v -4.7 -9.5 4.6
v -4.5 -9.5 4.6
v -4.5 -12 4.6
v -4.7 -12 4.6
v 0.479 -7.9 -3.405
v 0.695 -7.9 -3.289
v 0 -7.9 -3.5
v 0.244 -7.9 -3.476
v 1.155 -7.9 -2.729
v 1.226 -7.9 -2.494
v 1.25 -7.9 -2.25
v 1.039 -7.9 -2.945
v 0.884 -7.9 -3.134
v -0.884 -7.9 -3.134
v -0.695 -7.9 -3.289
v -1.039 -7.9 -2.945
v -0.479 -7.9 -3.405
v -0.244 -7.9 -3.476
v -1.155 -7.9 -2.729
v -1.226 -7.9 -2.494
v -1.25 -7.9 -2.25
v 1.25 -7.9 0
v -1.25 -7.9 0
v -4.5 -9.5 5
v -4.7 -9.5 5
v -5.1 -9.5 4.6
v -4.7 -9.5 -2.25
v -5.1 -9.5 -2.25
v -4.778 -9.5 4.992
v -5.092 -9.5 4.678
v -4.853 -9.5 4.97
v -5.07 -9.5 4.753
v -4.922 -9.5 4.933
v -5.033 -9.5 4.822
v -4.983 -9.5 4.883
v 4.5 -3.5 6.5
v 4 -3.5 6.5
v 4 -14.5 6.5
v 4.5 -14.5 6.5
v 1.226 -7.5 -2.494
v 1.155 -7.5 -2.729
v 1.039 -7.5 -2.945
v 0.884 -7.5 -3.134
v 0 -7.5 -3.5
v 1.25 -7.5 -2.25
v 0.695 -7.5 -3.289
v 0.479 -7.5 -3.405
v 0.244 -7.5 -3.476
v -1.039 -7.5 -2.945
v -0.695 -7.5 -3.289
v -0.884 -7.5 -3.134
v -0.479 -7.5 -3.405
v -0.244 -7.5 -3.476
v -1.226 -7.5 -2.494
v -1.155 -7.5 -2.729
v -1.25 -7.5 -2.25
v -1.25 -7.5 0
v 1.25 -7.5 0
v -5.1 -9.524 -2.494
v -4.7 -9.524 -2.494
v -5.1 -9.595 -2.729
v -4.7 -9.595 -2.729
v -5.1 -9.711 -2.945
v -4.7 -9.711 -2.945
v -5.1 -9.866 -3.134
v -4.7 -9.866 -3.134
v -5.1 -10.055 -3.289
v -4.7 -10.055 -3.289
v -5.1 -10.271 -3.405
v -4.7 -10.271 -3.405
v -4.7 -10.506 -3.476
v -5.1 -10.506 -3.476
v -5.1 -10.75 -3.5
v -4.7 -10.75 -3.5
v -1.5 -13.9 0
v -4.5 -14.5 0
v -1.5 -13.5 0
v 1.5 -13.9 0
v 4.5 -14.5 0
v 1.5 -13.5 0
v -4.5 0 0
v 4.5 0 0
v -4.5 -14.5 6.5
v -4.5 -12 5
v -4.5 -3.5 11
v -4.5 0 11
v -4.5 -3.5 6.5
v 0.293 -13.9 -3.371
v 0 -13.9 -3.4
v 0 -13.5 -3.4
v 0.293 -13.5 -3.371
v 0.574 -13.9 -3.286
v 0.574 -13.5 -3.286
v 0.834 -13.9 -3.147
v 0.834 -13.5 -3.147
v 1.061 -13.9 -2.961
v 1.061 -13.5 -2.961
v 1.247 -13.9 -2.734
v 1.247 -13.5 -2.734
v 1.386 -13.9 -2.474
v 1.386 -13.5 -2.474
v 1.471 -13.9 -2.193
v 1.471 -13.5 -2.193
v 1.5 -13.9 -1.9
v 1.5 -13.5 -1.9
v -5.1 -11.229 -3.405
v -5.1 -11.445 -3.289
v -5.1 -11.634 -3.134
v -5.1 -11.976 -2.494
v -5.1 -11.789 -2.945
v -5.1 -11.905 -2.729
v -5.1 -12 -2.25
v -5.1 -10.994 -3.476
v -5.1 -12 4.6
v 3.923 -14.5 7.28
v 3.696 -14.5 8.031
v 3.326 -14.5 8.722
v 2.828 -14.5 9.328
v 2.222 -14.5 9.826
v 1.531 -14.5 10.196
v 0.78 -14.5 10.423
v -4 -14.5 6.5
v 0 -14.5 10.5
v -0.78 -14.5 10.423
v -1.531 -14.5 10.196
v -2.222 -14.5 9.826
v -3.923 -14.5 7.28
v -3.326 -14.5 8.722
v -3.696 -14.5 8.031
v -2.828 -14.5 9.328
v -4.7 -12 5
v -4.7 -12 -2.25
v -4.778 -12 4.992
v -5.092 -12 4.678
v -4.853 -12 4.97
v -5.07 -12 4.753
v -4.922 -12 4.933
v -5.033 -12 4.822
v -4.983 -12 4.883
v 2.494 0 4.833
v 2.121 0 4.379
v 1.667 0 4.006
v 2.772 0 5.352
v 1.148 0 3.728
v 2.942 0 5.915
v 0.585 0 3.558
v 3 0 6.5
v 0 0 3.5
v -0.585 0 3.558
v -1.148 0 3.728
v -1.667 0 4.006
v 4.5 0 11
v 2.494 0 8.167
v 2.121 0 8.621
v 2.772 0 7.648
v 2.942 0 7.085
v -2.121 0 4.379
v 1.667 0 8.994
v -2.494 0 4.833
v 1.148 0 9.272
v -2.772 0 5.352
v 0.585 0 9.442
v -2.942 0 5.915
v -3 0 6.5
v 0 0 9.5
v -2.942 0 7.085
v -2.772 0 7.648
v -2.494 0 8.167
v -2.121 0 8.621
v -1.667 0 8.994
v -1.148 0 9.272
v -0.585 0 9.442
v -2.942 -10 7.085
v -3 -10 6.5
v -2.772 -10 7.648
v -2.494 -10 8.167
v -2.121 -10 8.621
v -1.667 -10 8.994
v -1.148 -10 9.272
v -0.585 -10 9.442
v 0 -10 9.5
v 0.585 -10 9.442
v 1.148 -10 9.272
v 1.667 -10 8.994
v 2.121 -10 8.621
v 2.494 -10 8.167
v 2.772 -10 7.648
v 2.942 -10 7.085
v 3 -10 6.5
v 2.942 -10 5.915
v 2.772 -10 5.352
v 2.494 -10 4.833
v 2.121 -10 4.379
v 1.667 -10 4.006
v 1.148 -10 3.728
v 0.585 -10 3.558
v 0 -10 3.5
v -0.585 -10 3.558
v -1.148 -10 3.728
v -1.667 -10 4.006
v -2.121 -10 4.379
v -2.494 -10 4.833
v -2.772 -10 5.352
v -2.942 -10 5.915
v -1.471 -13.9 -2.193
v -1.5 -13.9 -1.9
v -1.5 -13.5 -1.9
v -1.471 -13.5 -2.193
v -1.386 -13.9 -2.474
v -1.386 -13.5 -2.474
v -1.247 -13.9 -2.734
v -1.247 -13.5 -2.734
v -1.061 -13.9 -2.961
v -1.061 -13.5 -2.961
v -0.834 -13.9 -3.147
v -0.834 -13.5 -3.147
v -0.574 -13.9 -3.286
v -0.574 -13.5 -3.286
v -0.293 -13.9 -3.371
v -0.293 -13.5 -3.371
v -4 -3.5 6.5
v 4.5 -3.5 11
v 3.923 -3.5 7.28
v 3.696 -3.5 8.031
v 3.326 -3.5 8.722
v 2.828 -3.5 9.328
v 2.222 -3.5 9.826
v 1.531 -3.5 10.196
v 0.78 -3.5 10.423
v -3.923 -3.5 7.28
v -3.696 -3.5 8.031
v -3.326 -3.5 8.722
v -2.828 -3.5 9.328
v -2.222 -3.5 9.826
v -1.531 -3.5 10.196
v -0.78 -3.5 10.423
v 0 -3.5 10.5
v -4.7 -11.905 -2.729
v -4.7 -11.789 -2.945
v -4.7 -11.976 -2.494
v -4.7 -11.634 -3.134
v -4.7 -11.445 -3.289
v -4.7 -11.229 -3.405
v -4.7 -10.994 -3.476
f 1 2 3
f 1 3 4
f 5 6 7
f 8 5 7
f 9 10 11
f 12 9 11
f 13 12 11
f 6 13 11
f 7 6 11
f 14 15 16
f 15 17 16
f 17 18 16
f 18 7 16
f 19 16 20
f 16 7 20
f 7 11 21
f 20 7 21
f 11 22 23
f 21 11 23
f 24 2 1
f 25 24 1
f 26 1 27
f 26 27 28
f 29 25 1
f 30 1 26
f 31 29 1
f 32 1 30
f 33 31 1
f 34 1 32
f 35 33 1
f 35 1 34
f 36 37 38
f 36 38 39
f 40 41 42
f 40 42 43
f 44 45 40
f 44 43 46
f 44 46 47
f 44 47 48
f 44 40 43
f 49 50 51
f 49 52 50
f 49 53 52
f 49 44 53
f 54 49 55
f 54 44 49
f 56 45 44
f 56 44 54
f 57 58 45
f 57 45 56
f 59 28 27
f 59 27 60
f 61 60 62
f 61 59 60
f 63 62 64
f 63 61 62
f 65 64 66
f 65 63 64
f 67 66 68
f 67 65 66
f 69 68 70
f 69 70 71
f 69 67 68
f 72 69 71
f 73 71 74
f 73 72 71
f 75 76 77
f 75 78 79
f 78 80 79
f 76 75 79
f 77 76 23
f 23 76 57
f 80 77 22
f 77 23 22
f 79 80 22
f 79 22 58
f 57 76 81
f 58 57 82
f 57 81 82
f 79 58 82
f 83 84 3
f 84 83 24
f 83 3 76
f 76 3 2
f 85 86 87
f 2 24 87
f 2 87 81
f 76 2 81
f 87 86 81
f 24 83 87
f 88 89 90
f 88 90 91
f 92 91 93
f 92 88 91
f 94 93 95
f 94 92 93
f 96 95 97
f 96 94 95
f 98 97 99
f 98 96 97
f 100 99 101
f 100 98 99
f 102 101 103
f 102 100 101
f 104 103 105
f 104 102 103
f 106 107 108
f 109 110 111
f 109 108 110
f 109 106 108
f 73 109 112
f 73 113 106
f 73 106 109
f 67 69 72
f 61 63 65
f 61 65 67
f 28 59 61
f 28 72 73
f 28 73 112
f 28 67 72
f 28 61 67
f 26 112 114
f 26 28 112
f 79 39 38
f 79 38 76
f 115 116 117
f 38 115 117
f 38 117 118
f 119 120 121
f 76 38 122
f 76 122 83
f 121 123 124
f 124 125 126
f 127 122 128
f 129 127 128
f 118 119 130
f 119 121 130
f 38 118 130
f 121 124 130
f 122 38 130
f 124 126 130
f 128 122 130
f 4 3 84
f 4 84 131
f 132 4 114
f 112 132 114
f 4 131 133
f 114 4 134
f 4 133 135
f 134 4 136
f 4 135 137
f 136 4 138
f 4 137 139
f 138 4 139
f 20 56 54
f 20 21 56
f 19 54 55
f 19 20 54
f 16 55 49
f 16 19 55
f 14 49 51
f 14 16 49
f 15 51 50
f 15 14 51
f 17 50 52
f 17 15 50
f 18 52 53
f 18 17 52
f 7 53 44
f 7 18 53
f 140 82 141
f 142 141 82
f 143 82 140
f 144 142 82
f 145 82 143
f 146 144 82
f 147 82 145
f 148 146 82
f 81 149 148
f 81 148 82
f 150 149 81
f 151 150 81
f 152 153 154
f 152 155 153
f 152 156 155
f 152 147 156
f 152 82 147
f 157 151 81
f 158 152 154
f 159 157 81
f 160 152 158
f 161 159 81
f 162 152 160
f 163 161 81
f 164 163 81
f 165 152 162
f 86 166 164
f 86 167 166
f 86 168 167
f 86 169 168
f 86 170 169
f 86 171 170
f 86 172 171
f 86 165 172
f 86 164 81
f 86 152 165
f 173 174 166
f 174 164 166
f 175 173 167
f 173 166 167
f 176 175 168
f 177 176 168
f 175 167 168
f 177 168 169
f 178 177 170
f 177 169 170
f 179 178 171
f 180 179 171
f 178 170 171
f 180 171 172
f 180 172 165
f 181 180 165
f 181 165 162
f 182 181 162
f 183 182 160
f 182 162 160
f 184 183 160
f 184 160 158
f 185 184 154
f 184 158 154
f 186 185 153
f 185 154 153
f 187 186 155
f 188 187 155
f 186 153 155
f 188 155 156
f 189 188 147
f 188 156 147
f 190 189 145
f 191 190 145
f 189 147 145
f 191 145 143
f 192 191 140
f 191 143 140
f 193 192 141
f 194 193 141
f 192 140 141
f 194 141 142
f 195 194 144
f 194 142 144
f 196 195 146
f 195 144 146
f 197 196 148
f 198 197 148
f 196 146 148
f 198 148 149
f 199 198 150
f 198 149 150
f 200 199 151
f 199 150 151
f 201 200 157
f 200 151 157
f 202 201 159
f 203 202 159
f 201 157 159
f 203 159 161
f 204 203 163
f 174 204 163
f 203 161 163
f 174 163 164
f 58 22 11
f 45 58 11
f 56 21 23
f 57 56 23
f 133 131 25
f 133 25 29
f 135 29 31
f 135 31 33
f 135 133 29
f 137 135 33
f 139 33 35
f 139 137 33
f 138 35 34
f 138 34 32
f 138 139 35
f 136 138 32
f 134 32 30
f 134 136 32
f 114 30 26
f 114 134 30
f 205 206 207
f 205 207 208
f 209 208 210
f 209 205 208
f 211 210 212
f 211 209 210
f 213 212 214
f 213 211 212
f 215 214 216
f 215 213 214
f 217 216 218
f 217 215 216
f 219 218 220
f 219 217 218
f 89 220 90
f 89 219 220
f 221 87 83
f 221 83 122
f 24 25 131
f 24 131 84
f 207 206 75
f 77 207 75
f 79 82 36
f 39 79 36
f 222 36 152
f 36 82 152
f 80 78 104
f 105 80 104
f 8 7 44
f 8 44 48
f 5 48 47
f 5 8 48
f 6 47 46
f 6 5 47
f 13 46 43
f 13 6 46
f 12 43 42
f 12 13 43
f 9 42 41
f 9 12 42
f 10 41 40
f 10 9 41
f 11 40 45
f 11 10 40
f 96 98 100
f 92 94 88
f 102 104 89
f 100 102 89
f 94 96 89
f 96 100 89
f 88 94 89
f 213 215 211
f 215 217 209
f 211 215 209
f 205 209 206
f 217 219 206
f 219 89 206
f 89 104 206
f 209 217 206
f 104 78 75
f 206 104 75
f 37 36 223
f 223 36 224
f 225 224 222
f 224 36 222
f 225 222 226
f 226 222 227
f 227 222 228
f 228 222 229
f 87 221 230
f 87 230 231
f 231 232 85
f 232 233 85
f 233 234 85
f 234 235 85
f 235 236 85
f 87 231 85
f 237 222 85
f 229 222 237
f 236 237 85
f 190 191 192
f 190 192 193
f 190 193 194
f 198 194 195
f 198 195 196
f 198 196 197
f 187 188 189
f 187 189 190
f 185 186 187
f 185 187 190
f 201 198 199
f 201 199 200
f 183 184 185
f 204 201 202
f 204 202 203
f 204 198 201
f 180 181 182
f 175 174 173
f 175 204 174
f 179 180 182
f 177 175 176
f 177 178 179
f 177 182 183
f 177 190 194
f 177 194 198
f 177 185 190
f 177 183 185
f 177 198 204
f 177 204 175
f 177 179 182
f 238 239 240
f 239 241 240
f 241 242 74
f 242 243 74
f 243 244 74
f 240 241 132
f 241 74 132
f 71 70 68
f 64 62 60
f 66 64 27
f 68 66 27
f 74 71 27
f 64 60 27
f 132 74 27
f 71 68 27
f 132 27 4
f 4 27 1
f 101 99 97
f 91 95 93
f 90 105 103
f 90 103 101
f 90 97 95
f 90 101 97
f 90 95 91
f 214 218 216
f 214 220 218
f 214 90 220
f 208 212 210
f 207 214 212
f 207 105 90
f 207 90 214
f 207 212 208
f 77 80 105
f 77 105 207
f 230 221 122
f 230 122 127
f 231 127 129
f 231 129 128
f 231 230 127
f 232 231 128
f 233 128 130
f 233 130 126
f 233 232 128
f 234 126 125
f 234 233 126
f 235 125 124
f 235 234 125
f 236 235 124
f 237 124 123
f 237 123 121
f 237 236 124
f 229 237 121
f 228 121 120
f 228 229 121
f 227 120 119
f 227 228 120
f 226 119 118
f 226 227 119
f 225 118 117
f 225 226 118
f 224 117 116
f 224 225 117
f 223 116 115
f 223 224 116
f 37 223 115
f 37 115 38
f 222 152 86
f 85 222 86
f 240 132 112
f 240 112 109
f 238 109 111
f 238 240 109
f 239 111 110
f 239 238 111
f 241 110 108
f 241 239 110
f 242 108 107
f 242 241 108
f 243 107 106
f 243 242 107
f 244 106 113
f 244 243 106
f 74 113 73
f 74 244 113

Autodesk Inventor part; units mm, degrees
sketch "スケッチ1" plane through (0, 0, 0) normal (0, 1, 0) x (-1, 0, 0)
  line L0 (-4.5, 11) -> (4.5, 11)
  line L1 (4.5, 11) -> (4.5, 0)
  line L2 (4.5, 0) -> (-4.5, 0)
  line L3 (-4.5, 0) -> (-4.5, 11)
  point P0 (0, 0)
  dimension "d0" = 9
  dimension "d1" = 4.5
  dimension "d2" = 11
extrude "押し出し1" add sketch "スケッチ1" against normal blind 3.5
sketch "スケッチ3" plane through (0, 0, 0) normal (0, 1, 0) x (-1, 0, 0)
  circle A0 centre (0, 6.5) radius 4
  line L0 (-4, 6.5) -> (4, 6.5)
  line L1 (4, 6.5) -> (4, 0)
  line L2 (4, 0) -> (-4, 0)
  line L3 (-4, 0) -> (-4, 6.5)
  point P0 (0, 0)
  dimension "d9" = 8
  dimension "d10" = 6.5
extrude "押し出し3" add sketch "スケッチ3" against normal blind 14.5
ref_plane "作業平面1" through (0, -9.5, 0) normal (0, 1, 0) x (-1, 0, 0)
sketch "スケッチ4" plane through (0, 0, 0) normal (0, 1, 0) x (-1, 0, 0)
  point P0 (0, 0)
sketch "スケッチ5" plane through (0, 0, 0) normal (0, 1, 0) x (-1, 0, 0)
  line L0 (-4.5, 0) -> (4.5, 0)
  line L1 (4.5, 0) -> (4.5, 6.5)
  line L2 (4.5, 6.5) -> (-4.5, 6.5)
  line L3 (-4.5, 6.5) -> (-4.5, 0)
  point P0 (0, 0)
  dimension "d14" = 4.5
  dimension "d15" = 9
  dimension "d16" = 6.5
extrude "押し出し4" add sketch "スケッチ5" against normal blind 14.5
sketch "スケッチ6" plane through (0, -9.5, 0) normal (0, 1, 0) x (-1, 0, 0)
  line L0 (5.1, 5) -> (4.9, 5)
  line L1 (4.9, 5) -> (4.9, -3.5)
  line L2 (4.9, -3.5) -> (5.1, -3.5)
  line L3 (5.1, -3.5) -> (5.1, 5)
  line L4 (0, -13.24) -> (0, 15.04) projected
  line L5 (4.7, 5) -> (4.9, 5)
  line L6 (4.9, 5) -> (4.9, -3.5)
  line L7 (4.9, -3.5) -> (4.7, -3.5)
  line L8 (4.7, -3.5) -> (4.7, 5)
  line L9 (5.1, 5) -> (0, 5)
  line L10 (0, 5) -> (0, 4.6)
  line L11 (0, 4.6) -> (5.1, 4.6)
  line L12 (5.1, 4.6) -> (5.1, 5)
  point P0 (0, 0)
  dimension "d19" = 4.9
  dimension "d20" = 0.2
  dimension "d21" = 3.5
  dimension "d22" = 5
  dimension "d27" = 0.2
  dimension "d28" = 0.4
extrude "押し出し5" add sketch "スケッチ6" against normal blind 2.5
ref_plane "作業平面2" through (0, -10.75, 0) normal (0, 1, 0) x (-1, 0, 0)
fillet "フィレット1" radius 0.4 1 edges at (-5.1, -10.75, 5)
ref_plane "作業平面4" through (0, -13.7, 0) normal (0, 1, 0) x (-1, 0, 0)
sketch "スケッチ7" plane through (0, -13.7, 0) normal (0, 1, 0) x (-1, 0, 0)
  line L0 (1.5, 5.7) -> (-1.5, 5.7)
  line L1 (-1.5, 5.7) -> (-1.5, -3.4)
  line L2 (-1.5, -3.4) -> (1.5, -3.4)
  line L3 (1.5, -3.4) -> (1.5, 5.7)
  point P0 (0, 0)
  dimension "d31" = 1.5
  dimension "d32" = 3
extrude "押し出し6" add sketch "スケッチ7" along normal mid plane 0.4
fillet "フィレット2" radius 1.5 1 edges at (-1.5, -13.7, -3.4)
fillet "フィレット2" radius 1.5 1 edges at (1.5, -13.7, -3.4)
ref_plane "作業平面5" through (0, -7.7, 0) normal (0, 1, 0) x (-1, 0, 0)
sketch "スケッチ8" plane through (0, -7.7, 0) normal (0, 1, 0) x (-1, 0, 0)
  line L0 (1.25, 6.5) -> (-1.25, 6.5)
  line L1 (-1.25, 6.5) -> (-1.25, -3.5)
  line L2 (-1.25, -3.5) -> (1.25, -3.5)
  line L3 (1.25, -3.5) -> (1.25, 6.5)
  line L4 (4.5, 0) -> (-4.5, 0) projected
  point P0 (0, 0)
  dimension "d38" = 3.5
  dimension "d39" = 2.5
  dimension "d40" = 1.25
  dimension "d41" = 6.5
extrude "押し出し7" add sketch "スケッチ8" along normal mid plane 0.4
fillet "フィレット3" radius 1.25 1 edges at (1.25, -7.7, -3.5)
fillet "フィレット3" radius 1.25 3 edges at (-1.25, -7.7, -3.5) (-4.9, -9.5, -3.5) (-4.9, -12, -3.5)
sketch "スケッチ9" plane through (0, 0, 0) normal (0, 1, 0) x (-1, 0, 0)
  circle A0 centre (0, 6.5) radius 3
  point P0 (0, 0)
  dimension "d46" = 6
  dimension "d47" = 6.5
extrude "押し出し8" cut sketch "スケッチ9" against normal blind 10
sketch "スケッチ2" plane through (0, 0, 0) normal (0, 1, 0) x (-1, 0, 0)
  circle A0 centre (0, 6.5) radius 3
  line L0 (4.5, 0) -> (-4.5, 0) projected
  point P0 (0, 0)
  dimension "d5" = 6
  dimension "d6" = 6.5
properties part number "MJ179PH"
